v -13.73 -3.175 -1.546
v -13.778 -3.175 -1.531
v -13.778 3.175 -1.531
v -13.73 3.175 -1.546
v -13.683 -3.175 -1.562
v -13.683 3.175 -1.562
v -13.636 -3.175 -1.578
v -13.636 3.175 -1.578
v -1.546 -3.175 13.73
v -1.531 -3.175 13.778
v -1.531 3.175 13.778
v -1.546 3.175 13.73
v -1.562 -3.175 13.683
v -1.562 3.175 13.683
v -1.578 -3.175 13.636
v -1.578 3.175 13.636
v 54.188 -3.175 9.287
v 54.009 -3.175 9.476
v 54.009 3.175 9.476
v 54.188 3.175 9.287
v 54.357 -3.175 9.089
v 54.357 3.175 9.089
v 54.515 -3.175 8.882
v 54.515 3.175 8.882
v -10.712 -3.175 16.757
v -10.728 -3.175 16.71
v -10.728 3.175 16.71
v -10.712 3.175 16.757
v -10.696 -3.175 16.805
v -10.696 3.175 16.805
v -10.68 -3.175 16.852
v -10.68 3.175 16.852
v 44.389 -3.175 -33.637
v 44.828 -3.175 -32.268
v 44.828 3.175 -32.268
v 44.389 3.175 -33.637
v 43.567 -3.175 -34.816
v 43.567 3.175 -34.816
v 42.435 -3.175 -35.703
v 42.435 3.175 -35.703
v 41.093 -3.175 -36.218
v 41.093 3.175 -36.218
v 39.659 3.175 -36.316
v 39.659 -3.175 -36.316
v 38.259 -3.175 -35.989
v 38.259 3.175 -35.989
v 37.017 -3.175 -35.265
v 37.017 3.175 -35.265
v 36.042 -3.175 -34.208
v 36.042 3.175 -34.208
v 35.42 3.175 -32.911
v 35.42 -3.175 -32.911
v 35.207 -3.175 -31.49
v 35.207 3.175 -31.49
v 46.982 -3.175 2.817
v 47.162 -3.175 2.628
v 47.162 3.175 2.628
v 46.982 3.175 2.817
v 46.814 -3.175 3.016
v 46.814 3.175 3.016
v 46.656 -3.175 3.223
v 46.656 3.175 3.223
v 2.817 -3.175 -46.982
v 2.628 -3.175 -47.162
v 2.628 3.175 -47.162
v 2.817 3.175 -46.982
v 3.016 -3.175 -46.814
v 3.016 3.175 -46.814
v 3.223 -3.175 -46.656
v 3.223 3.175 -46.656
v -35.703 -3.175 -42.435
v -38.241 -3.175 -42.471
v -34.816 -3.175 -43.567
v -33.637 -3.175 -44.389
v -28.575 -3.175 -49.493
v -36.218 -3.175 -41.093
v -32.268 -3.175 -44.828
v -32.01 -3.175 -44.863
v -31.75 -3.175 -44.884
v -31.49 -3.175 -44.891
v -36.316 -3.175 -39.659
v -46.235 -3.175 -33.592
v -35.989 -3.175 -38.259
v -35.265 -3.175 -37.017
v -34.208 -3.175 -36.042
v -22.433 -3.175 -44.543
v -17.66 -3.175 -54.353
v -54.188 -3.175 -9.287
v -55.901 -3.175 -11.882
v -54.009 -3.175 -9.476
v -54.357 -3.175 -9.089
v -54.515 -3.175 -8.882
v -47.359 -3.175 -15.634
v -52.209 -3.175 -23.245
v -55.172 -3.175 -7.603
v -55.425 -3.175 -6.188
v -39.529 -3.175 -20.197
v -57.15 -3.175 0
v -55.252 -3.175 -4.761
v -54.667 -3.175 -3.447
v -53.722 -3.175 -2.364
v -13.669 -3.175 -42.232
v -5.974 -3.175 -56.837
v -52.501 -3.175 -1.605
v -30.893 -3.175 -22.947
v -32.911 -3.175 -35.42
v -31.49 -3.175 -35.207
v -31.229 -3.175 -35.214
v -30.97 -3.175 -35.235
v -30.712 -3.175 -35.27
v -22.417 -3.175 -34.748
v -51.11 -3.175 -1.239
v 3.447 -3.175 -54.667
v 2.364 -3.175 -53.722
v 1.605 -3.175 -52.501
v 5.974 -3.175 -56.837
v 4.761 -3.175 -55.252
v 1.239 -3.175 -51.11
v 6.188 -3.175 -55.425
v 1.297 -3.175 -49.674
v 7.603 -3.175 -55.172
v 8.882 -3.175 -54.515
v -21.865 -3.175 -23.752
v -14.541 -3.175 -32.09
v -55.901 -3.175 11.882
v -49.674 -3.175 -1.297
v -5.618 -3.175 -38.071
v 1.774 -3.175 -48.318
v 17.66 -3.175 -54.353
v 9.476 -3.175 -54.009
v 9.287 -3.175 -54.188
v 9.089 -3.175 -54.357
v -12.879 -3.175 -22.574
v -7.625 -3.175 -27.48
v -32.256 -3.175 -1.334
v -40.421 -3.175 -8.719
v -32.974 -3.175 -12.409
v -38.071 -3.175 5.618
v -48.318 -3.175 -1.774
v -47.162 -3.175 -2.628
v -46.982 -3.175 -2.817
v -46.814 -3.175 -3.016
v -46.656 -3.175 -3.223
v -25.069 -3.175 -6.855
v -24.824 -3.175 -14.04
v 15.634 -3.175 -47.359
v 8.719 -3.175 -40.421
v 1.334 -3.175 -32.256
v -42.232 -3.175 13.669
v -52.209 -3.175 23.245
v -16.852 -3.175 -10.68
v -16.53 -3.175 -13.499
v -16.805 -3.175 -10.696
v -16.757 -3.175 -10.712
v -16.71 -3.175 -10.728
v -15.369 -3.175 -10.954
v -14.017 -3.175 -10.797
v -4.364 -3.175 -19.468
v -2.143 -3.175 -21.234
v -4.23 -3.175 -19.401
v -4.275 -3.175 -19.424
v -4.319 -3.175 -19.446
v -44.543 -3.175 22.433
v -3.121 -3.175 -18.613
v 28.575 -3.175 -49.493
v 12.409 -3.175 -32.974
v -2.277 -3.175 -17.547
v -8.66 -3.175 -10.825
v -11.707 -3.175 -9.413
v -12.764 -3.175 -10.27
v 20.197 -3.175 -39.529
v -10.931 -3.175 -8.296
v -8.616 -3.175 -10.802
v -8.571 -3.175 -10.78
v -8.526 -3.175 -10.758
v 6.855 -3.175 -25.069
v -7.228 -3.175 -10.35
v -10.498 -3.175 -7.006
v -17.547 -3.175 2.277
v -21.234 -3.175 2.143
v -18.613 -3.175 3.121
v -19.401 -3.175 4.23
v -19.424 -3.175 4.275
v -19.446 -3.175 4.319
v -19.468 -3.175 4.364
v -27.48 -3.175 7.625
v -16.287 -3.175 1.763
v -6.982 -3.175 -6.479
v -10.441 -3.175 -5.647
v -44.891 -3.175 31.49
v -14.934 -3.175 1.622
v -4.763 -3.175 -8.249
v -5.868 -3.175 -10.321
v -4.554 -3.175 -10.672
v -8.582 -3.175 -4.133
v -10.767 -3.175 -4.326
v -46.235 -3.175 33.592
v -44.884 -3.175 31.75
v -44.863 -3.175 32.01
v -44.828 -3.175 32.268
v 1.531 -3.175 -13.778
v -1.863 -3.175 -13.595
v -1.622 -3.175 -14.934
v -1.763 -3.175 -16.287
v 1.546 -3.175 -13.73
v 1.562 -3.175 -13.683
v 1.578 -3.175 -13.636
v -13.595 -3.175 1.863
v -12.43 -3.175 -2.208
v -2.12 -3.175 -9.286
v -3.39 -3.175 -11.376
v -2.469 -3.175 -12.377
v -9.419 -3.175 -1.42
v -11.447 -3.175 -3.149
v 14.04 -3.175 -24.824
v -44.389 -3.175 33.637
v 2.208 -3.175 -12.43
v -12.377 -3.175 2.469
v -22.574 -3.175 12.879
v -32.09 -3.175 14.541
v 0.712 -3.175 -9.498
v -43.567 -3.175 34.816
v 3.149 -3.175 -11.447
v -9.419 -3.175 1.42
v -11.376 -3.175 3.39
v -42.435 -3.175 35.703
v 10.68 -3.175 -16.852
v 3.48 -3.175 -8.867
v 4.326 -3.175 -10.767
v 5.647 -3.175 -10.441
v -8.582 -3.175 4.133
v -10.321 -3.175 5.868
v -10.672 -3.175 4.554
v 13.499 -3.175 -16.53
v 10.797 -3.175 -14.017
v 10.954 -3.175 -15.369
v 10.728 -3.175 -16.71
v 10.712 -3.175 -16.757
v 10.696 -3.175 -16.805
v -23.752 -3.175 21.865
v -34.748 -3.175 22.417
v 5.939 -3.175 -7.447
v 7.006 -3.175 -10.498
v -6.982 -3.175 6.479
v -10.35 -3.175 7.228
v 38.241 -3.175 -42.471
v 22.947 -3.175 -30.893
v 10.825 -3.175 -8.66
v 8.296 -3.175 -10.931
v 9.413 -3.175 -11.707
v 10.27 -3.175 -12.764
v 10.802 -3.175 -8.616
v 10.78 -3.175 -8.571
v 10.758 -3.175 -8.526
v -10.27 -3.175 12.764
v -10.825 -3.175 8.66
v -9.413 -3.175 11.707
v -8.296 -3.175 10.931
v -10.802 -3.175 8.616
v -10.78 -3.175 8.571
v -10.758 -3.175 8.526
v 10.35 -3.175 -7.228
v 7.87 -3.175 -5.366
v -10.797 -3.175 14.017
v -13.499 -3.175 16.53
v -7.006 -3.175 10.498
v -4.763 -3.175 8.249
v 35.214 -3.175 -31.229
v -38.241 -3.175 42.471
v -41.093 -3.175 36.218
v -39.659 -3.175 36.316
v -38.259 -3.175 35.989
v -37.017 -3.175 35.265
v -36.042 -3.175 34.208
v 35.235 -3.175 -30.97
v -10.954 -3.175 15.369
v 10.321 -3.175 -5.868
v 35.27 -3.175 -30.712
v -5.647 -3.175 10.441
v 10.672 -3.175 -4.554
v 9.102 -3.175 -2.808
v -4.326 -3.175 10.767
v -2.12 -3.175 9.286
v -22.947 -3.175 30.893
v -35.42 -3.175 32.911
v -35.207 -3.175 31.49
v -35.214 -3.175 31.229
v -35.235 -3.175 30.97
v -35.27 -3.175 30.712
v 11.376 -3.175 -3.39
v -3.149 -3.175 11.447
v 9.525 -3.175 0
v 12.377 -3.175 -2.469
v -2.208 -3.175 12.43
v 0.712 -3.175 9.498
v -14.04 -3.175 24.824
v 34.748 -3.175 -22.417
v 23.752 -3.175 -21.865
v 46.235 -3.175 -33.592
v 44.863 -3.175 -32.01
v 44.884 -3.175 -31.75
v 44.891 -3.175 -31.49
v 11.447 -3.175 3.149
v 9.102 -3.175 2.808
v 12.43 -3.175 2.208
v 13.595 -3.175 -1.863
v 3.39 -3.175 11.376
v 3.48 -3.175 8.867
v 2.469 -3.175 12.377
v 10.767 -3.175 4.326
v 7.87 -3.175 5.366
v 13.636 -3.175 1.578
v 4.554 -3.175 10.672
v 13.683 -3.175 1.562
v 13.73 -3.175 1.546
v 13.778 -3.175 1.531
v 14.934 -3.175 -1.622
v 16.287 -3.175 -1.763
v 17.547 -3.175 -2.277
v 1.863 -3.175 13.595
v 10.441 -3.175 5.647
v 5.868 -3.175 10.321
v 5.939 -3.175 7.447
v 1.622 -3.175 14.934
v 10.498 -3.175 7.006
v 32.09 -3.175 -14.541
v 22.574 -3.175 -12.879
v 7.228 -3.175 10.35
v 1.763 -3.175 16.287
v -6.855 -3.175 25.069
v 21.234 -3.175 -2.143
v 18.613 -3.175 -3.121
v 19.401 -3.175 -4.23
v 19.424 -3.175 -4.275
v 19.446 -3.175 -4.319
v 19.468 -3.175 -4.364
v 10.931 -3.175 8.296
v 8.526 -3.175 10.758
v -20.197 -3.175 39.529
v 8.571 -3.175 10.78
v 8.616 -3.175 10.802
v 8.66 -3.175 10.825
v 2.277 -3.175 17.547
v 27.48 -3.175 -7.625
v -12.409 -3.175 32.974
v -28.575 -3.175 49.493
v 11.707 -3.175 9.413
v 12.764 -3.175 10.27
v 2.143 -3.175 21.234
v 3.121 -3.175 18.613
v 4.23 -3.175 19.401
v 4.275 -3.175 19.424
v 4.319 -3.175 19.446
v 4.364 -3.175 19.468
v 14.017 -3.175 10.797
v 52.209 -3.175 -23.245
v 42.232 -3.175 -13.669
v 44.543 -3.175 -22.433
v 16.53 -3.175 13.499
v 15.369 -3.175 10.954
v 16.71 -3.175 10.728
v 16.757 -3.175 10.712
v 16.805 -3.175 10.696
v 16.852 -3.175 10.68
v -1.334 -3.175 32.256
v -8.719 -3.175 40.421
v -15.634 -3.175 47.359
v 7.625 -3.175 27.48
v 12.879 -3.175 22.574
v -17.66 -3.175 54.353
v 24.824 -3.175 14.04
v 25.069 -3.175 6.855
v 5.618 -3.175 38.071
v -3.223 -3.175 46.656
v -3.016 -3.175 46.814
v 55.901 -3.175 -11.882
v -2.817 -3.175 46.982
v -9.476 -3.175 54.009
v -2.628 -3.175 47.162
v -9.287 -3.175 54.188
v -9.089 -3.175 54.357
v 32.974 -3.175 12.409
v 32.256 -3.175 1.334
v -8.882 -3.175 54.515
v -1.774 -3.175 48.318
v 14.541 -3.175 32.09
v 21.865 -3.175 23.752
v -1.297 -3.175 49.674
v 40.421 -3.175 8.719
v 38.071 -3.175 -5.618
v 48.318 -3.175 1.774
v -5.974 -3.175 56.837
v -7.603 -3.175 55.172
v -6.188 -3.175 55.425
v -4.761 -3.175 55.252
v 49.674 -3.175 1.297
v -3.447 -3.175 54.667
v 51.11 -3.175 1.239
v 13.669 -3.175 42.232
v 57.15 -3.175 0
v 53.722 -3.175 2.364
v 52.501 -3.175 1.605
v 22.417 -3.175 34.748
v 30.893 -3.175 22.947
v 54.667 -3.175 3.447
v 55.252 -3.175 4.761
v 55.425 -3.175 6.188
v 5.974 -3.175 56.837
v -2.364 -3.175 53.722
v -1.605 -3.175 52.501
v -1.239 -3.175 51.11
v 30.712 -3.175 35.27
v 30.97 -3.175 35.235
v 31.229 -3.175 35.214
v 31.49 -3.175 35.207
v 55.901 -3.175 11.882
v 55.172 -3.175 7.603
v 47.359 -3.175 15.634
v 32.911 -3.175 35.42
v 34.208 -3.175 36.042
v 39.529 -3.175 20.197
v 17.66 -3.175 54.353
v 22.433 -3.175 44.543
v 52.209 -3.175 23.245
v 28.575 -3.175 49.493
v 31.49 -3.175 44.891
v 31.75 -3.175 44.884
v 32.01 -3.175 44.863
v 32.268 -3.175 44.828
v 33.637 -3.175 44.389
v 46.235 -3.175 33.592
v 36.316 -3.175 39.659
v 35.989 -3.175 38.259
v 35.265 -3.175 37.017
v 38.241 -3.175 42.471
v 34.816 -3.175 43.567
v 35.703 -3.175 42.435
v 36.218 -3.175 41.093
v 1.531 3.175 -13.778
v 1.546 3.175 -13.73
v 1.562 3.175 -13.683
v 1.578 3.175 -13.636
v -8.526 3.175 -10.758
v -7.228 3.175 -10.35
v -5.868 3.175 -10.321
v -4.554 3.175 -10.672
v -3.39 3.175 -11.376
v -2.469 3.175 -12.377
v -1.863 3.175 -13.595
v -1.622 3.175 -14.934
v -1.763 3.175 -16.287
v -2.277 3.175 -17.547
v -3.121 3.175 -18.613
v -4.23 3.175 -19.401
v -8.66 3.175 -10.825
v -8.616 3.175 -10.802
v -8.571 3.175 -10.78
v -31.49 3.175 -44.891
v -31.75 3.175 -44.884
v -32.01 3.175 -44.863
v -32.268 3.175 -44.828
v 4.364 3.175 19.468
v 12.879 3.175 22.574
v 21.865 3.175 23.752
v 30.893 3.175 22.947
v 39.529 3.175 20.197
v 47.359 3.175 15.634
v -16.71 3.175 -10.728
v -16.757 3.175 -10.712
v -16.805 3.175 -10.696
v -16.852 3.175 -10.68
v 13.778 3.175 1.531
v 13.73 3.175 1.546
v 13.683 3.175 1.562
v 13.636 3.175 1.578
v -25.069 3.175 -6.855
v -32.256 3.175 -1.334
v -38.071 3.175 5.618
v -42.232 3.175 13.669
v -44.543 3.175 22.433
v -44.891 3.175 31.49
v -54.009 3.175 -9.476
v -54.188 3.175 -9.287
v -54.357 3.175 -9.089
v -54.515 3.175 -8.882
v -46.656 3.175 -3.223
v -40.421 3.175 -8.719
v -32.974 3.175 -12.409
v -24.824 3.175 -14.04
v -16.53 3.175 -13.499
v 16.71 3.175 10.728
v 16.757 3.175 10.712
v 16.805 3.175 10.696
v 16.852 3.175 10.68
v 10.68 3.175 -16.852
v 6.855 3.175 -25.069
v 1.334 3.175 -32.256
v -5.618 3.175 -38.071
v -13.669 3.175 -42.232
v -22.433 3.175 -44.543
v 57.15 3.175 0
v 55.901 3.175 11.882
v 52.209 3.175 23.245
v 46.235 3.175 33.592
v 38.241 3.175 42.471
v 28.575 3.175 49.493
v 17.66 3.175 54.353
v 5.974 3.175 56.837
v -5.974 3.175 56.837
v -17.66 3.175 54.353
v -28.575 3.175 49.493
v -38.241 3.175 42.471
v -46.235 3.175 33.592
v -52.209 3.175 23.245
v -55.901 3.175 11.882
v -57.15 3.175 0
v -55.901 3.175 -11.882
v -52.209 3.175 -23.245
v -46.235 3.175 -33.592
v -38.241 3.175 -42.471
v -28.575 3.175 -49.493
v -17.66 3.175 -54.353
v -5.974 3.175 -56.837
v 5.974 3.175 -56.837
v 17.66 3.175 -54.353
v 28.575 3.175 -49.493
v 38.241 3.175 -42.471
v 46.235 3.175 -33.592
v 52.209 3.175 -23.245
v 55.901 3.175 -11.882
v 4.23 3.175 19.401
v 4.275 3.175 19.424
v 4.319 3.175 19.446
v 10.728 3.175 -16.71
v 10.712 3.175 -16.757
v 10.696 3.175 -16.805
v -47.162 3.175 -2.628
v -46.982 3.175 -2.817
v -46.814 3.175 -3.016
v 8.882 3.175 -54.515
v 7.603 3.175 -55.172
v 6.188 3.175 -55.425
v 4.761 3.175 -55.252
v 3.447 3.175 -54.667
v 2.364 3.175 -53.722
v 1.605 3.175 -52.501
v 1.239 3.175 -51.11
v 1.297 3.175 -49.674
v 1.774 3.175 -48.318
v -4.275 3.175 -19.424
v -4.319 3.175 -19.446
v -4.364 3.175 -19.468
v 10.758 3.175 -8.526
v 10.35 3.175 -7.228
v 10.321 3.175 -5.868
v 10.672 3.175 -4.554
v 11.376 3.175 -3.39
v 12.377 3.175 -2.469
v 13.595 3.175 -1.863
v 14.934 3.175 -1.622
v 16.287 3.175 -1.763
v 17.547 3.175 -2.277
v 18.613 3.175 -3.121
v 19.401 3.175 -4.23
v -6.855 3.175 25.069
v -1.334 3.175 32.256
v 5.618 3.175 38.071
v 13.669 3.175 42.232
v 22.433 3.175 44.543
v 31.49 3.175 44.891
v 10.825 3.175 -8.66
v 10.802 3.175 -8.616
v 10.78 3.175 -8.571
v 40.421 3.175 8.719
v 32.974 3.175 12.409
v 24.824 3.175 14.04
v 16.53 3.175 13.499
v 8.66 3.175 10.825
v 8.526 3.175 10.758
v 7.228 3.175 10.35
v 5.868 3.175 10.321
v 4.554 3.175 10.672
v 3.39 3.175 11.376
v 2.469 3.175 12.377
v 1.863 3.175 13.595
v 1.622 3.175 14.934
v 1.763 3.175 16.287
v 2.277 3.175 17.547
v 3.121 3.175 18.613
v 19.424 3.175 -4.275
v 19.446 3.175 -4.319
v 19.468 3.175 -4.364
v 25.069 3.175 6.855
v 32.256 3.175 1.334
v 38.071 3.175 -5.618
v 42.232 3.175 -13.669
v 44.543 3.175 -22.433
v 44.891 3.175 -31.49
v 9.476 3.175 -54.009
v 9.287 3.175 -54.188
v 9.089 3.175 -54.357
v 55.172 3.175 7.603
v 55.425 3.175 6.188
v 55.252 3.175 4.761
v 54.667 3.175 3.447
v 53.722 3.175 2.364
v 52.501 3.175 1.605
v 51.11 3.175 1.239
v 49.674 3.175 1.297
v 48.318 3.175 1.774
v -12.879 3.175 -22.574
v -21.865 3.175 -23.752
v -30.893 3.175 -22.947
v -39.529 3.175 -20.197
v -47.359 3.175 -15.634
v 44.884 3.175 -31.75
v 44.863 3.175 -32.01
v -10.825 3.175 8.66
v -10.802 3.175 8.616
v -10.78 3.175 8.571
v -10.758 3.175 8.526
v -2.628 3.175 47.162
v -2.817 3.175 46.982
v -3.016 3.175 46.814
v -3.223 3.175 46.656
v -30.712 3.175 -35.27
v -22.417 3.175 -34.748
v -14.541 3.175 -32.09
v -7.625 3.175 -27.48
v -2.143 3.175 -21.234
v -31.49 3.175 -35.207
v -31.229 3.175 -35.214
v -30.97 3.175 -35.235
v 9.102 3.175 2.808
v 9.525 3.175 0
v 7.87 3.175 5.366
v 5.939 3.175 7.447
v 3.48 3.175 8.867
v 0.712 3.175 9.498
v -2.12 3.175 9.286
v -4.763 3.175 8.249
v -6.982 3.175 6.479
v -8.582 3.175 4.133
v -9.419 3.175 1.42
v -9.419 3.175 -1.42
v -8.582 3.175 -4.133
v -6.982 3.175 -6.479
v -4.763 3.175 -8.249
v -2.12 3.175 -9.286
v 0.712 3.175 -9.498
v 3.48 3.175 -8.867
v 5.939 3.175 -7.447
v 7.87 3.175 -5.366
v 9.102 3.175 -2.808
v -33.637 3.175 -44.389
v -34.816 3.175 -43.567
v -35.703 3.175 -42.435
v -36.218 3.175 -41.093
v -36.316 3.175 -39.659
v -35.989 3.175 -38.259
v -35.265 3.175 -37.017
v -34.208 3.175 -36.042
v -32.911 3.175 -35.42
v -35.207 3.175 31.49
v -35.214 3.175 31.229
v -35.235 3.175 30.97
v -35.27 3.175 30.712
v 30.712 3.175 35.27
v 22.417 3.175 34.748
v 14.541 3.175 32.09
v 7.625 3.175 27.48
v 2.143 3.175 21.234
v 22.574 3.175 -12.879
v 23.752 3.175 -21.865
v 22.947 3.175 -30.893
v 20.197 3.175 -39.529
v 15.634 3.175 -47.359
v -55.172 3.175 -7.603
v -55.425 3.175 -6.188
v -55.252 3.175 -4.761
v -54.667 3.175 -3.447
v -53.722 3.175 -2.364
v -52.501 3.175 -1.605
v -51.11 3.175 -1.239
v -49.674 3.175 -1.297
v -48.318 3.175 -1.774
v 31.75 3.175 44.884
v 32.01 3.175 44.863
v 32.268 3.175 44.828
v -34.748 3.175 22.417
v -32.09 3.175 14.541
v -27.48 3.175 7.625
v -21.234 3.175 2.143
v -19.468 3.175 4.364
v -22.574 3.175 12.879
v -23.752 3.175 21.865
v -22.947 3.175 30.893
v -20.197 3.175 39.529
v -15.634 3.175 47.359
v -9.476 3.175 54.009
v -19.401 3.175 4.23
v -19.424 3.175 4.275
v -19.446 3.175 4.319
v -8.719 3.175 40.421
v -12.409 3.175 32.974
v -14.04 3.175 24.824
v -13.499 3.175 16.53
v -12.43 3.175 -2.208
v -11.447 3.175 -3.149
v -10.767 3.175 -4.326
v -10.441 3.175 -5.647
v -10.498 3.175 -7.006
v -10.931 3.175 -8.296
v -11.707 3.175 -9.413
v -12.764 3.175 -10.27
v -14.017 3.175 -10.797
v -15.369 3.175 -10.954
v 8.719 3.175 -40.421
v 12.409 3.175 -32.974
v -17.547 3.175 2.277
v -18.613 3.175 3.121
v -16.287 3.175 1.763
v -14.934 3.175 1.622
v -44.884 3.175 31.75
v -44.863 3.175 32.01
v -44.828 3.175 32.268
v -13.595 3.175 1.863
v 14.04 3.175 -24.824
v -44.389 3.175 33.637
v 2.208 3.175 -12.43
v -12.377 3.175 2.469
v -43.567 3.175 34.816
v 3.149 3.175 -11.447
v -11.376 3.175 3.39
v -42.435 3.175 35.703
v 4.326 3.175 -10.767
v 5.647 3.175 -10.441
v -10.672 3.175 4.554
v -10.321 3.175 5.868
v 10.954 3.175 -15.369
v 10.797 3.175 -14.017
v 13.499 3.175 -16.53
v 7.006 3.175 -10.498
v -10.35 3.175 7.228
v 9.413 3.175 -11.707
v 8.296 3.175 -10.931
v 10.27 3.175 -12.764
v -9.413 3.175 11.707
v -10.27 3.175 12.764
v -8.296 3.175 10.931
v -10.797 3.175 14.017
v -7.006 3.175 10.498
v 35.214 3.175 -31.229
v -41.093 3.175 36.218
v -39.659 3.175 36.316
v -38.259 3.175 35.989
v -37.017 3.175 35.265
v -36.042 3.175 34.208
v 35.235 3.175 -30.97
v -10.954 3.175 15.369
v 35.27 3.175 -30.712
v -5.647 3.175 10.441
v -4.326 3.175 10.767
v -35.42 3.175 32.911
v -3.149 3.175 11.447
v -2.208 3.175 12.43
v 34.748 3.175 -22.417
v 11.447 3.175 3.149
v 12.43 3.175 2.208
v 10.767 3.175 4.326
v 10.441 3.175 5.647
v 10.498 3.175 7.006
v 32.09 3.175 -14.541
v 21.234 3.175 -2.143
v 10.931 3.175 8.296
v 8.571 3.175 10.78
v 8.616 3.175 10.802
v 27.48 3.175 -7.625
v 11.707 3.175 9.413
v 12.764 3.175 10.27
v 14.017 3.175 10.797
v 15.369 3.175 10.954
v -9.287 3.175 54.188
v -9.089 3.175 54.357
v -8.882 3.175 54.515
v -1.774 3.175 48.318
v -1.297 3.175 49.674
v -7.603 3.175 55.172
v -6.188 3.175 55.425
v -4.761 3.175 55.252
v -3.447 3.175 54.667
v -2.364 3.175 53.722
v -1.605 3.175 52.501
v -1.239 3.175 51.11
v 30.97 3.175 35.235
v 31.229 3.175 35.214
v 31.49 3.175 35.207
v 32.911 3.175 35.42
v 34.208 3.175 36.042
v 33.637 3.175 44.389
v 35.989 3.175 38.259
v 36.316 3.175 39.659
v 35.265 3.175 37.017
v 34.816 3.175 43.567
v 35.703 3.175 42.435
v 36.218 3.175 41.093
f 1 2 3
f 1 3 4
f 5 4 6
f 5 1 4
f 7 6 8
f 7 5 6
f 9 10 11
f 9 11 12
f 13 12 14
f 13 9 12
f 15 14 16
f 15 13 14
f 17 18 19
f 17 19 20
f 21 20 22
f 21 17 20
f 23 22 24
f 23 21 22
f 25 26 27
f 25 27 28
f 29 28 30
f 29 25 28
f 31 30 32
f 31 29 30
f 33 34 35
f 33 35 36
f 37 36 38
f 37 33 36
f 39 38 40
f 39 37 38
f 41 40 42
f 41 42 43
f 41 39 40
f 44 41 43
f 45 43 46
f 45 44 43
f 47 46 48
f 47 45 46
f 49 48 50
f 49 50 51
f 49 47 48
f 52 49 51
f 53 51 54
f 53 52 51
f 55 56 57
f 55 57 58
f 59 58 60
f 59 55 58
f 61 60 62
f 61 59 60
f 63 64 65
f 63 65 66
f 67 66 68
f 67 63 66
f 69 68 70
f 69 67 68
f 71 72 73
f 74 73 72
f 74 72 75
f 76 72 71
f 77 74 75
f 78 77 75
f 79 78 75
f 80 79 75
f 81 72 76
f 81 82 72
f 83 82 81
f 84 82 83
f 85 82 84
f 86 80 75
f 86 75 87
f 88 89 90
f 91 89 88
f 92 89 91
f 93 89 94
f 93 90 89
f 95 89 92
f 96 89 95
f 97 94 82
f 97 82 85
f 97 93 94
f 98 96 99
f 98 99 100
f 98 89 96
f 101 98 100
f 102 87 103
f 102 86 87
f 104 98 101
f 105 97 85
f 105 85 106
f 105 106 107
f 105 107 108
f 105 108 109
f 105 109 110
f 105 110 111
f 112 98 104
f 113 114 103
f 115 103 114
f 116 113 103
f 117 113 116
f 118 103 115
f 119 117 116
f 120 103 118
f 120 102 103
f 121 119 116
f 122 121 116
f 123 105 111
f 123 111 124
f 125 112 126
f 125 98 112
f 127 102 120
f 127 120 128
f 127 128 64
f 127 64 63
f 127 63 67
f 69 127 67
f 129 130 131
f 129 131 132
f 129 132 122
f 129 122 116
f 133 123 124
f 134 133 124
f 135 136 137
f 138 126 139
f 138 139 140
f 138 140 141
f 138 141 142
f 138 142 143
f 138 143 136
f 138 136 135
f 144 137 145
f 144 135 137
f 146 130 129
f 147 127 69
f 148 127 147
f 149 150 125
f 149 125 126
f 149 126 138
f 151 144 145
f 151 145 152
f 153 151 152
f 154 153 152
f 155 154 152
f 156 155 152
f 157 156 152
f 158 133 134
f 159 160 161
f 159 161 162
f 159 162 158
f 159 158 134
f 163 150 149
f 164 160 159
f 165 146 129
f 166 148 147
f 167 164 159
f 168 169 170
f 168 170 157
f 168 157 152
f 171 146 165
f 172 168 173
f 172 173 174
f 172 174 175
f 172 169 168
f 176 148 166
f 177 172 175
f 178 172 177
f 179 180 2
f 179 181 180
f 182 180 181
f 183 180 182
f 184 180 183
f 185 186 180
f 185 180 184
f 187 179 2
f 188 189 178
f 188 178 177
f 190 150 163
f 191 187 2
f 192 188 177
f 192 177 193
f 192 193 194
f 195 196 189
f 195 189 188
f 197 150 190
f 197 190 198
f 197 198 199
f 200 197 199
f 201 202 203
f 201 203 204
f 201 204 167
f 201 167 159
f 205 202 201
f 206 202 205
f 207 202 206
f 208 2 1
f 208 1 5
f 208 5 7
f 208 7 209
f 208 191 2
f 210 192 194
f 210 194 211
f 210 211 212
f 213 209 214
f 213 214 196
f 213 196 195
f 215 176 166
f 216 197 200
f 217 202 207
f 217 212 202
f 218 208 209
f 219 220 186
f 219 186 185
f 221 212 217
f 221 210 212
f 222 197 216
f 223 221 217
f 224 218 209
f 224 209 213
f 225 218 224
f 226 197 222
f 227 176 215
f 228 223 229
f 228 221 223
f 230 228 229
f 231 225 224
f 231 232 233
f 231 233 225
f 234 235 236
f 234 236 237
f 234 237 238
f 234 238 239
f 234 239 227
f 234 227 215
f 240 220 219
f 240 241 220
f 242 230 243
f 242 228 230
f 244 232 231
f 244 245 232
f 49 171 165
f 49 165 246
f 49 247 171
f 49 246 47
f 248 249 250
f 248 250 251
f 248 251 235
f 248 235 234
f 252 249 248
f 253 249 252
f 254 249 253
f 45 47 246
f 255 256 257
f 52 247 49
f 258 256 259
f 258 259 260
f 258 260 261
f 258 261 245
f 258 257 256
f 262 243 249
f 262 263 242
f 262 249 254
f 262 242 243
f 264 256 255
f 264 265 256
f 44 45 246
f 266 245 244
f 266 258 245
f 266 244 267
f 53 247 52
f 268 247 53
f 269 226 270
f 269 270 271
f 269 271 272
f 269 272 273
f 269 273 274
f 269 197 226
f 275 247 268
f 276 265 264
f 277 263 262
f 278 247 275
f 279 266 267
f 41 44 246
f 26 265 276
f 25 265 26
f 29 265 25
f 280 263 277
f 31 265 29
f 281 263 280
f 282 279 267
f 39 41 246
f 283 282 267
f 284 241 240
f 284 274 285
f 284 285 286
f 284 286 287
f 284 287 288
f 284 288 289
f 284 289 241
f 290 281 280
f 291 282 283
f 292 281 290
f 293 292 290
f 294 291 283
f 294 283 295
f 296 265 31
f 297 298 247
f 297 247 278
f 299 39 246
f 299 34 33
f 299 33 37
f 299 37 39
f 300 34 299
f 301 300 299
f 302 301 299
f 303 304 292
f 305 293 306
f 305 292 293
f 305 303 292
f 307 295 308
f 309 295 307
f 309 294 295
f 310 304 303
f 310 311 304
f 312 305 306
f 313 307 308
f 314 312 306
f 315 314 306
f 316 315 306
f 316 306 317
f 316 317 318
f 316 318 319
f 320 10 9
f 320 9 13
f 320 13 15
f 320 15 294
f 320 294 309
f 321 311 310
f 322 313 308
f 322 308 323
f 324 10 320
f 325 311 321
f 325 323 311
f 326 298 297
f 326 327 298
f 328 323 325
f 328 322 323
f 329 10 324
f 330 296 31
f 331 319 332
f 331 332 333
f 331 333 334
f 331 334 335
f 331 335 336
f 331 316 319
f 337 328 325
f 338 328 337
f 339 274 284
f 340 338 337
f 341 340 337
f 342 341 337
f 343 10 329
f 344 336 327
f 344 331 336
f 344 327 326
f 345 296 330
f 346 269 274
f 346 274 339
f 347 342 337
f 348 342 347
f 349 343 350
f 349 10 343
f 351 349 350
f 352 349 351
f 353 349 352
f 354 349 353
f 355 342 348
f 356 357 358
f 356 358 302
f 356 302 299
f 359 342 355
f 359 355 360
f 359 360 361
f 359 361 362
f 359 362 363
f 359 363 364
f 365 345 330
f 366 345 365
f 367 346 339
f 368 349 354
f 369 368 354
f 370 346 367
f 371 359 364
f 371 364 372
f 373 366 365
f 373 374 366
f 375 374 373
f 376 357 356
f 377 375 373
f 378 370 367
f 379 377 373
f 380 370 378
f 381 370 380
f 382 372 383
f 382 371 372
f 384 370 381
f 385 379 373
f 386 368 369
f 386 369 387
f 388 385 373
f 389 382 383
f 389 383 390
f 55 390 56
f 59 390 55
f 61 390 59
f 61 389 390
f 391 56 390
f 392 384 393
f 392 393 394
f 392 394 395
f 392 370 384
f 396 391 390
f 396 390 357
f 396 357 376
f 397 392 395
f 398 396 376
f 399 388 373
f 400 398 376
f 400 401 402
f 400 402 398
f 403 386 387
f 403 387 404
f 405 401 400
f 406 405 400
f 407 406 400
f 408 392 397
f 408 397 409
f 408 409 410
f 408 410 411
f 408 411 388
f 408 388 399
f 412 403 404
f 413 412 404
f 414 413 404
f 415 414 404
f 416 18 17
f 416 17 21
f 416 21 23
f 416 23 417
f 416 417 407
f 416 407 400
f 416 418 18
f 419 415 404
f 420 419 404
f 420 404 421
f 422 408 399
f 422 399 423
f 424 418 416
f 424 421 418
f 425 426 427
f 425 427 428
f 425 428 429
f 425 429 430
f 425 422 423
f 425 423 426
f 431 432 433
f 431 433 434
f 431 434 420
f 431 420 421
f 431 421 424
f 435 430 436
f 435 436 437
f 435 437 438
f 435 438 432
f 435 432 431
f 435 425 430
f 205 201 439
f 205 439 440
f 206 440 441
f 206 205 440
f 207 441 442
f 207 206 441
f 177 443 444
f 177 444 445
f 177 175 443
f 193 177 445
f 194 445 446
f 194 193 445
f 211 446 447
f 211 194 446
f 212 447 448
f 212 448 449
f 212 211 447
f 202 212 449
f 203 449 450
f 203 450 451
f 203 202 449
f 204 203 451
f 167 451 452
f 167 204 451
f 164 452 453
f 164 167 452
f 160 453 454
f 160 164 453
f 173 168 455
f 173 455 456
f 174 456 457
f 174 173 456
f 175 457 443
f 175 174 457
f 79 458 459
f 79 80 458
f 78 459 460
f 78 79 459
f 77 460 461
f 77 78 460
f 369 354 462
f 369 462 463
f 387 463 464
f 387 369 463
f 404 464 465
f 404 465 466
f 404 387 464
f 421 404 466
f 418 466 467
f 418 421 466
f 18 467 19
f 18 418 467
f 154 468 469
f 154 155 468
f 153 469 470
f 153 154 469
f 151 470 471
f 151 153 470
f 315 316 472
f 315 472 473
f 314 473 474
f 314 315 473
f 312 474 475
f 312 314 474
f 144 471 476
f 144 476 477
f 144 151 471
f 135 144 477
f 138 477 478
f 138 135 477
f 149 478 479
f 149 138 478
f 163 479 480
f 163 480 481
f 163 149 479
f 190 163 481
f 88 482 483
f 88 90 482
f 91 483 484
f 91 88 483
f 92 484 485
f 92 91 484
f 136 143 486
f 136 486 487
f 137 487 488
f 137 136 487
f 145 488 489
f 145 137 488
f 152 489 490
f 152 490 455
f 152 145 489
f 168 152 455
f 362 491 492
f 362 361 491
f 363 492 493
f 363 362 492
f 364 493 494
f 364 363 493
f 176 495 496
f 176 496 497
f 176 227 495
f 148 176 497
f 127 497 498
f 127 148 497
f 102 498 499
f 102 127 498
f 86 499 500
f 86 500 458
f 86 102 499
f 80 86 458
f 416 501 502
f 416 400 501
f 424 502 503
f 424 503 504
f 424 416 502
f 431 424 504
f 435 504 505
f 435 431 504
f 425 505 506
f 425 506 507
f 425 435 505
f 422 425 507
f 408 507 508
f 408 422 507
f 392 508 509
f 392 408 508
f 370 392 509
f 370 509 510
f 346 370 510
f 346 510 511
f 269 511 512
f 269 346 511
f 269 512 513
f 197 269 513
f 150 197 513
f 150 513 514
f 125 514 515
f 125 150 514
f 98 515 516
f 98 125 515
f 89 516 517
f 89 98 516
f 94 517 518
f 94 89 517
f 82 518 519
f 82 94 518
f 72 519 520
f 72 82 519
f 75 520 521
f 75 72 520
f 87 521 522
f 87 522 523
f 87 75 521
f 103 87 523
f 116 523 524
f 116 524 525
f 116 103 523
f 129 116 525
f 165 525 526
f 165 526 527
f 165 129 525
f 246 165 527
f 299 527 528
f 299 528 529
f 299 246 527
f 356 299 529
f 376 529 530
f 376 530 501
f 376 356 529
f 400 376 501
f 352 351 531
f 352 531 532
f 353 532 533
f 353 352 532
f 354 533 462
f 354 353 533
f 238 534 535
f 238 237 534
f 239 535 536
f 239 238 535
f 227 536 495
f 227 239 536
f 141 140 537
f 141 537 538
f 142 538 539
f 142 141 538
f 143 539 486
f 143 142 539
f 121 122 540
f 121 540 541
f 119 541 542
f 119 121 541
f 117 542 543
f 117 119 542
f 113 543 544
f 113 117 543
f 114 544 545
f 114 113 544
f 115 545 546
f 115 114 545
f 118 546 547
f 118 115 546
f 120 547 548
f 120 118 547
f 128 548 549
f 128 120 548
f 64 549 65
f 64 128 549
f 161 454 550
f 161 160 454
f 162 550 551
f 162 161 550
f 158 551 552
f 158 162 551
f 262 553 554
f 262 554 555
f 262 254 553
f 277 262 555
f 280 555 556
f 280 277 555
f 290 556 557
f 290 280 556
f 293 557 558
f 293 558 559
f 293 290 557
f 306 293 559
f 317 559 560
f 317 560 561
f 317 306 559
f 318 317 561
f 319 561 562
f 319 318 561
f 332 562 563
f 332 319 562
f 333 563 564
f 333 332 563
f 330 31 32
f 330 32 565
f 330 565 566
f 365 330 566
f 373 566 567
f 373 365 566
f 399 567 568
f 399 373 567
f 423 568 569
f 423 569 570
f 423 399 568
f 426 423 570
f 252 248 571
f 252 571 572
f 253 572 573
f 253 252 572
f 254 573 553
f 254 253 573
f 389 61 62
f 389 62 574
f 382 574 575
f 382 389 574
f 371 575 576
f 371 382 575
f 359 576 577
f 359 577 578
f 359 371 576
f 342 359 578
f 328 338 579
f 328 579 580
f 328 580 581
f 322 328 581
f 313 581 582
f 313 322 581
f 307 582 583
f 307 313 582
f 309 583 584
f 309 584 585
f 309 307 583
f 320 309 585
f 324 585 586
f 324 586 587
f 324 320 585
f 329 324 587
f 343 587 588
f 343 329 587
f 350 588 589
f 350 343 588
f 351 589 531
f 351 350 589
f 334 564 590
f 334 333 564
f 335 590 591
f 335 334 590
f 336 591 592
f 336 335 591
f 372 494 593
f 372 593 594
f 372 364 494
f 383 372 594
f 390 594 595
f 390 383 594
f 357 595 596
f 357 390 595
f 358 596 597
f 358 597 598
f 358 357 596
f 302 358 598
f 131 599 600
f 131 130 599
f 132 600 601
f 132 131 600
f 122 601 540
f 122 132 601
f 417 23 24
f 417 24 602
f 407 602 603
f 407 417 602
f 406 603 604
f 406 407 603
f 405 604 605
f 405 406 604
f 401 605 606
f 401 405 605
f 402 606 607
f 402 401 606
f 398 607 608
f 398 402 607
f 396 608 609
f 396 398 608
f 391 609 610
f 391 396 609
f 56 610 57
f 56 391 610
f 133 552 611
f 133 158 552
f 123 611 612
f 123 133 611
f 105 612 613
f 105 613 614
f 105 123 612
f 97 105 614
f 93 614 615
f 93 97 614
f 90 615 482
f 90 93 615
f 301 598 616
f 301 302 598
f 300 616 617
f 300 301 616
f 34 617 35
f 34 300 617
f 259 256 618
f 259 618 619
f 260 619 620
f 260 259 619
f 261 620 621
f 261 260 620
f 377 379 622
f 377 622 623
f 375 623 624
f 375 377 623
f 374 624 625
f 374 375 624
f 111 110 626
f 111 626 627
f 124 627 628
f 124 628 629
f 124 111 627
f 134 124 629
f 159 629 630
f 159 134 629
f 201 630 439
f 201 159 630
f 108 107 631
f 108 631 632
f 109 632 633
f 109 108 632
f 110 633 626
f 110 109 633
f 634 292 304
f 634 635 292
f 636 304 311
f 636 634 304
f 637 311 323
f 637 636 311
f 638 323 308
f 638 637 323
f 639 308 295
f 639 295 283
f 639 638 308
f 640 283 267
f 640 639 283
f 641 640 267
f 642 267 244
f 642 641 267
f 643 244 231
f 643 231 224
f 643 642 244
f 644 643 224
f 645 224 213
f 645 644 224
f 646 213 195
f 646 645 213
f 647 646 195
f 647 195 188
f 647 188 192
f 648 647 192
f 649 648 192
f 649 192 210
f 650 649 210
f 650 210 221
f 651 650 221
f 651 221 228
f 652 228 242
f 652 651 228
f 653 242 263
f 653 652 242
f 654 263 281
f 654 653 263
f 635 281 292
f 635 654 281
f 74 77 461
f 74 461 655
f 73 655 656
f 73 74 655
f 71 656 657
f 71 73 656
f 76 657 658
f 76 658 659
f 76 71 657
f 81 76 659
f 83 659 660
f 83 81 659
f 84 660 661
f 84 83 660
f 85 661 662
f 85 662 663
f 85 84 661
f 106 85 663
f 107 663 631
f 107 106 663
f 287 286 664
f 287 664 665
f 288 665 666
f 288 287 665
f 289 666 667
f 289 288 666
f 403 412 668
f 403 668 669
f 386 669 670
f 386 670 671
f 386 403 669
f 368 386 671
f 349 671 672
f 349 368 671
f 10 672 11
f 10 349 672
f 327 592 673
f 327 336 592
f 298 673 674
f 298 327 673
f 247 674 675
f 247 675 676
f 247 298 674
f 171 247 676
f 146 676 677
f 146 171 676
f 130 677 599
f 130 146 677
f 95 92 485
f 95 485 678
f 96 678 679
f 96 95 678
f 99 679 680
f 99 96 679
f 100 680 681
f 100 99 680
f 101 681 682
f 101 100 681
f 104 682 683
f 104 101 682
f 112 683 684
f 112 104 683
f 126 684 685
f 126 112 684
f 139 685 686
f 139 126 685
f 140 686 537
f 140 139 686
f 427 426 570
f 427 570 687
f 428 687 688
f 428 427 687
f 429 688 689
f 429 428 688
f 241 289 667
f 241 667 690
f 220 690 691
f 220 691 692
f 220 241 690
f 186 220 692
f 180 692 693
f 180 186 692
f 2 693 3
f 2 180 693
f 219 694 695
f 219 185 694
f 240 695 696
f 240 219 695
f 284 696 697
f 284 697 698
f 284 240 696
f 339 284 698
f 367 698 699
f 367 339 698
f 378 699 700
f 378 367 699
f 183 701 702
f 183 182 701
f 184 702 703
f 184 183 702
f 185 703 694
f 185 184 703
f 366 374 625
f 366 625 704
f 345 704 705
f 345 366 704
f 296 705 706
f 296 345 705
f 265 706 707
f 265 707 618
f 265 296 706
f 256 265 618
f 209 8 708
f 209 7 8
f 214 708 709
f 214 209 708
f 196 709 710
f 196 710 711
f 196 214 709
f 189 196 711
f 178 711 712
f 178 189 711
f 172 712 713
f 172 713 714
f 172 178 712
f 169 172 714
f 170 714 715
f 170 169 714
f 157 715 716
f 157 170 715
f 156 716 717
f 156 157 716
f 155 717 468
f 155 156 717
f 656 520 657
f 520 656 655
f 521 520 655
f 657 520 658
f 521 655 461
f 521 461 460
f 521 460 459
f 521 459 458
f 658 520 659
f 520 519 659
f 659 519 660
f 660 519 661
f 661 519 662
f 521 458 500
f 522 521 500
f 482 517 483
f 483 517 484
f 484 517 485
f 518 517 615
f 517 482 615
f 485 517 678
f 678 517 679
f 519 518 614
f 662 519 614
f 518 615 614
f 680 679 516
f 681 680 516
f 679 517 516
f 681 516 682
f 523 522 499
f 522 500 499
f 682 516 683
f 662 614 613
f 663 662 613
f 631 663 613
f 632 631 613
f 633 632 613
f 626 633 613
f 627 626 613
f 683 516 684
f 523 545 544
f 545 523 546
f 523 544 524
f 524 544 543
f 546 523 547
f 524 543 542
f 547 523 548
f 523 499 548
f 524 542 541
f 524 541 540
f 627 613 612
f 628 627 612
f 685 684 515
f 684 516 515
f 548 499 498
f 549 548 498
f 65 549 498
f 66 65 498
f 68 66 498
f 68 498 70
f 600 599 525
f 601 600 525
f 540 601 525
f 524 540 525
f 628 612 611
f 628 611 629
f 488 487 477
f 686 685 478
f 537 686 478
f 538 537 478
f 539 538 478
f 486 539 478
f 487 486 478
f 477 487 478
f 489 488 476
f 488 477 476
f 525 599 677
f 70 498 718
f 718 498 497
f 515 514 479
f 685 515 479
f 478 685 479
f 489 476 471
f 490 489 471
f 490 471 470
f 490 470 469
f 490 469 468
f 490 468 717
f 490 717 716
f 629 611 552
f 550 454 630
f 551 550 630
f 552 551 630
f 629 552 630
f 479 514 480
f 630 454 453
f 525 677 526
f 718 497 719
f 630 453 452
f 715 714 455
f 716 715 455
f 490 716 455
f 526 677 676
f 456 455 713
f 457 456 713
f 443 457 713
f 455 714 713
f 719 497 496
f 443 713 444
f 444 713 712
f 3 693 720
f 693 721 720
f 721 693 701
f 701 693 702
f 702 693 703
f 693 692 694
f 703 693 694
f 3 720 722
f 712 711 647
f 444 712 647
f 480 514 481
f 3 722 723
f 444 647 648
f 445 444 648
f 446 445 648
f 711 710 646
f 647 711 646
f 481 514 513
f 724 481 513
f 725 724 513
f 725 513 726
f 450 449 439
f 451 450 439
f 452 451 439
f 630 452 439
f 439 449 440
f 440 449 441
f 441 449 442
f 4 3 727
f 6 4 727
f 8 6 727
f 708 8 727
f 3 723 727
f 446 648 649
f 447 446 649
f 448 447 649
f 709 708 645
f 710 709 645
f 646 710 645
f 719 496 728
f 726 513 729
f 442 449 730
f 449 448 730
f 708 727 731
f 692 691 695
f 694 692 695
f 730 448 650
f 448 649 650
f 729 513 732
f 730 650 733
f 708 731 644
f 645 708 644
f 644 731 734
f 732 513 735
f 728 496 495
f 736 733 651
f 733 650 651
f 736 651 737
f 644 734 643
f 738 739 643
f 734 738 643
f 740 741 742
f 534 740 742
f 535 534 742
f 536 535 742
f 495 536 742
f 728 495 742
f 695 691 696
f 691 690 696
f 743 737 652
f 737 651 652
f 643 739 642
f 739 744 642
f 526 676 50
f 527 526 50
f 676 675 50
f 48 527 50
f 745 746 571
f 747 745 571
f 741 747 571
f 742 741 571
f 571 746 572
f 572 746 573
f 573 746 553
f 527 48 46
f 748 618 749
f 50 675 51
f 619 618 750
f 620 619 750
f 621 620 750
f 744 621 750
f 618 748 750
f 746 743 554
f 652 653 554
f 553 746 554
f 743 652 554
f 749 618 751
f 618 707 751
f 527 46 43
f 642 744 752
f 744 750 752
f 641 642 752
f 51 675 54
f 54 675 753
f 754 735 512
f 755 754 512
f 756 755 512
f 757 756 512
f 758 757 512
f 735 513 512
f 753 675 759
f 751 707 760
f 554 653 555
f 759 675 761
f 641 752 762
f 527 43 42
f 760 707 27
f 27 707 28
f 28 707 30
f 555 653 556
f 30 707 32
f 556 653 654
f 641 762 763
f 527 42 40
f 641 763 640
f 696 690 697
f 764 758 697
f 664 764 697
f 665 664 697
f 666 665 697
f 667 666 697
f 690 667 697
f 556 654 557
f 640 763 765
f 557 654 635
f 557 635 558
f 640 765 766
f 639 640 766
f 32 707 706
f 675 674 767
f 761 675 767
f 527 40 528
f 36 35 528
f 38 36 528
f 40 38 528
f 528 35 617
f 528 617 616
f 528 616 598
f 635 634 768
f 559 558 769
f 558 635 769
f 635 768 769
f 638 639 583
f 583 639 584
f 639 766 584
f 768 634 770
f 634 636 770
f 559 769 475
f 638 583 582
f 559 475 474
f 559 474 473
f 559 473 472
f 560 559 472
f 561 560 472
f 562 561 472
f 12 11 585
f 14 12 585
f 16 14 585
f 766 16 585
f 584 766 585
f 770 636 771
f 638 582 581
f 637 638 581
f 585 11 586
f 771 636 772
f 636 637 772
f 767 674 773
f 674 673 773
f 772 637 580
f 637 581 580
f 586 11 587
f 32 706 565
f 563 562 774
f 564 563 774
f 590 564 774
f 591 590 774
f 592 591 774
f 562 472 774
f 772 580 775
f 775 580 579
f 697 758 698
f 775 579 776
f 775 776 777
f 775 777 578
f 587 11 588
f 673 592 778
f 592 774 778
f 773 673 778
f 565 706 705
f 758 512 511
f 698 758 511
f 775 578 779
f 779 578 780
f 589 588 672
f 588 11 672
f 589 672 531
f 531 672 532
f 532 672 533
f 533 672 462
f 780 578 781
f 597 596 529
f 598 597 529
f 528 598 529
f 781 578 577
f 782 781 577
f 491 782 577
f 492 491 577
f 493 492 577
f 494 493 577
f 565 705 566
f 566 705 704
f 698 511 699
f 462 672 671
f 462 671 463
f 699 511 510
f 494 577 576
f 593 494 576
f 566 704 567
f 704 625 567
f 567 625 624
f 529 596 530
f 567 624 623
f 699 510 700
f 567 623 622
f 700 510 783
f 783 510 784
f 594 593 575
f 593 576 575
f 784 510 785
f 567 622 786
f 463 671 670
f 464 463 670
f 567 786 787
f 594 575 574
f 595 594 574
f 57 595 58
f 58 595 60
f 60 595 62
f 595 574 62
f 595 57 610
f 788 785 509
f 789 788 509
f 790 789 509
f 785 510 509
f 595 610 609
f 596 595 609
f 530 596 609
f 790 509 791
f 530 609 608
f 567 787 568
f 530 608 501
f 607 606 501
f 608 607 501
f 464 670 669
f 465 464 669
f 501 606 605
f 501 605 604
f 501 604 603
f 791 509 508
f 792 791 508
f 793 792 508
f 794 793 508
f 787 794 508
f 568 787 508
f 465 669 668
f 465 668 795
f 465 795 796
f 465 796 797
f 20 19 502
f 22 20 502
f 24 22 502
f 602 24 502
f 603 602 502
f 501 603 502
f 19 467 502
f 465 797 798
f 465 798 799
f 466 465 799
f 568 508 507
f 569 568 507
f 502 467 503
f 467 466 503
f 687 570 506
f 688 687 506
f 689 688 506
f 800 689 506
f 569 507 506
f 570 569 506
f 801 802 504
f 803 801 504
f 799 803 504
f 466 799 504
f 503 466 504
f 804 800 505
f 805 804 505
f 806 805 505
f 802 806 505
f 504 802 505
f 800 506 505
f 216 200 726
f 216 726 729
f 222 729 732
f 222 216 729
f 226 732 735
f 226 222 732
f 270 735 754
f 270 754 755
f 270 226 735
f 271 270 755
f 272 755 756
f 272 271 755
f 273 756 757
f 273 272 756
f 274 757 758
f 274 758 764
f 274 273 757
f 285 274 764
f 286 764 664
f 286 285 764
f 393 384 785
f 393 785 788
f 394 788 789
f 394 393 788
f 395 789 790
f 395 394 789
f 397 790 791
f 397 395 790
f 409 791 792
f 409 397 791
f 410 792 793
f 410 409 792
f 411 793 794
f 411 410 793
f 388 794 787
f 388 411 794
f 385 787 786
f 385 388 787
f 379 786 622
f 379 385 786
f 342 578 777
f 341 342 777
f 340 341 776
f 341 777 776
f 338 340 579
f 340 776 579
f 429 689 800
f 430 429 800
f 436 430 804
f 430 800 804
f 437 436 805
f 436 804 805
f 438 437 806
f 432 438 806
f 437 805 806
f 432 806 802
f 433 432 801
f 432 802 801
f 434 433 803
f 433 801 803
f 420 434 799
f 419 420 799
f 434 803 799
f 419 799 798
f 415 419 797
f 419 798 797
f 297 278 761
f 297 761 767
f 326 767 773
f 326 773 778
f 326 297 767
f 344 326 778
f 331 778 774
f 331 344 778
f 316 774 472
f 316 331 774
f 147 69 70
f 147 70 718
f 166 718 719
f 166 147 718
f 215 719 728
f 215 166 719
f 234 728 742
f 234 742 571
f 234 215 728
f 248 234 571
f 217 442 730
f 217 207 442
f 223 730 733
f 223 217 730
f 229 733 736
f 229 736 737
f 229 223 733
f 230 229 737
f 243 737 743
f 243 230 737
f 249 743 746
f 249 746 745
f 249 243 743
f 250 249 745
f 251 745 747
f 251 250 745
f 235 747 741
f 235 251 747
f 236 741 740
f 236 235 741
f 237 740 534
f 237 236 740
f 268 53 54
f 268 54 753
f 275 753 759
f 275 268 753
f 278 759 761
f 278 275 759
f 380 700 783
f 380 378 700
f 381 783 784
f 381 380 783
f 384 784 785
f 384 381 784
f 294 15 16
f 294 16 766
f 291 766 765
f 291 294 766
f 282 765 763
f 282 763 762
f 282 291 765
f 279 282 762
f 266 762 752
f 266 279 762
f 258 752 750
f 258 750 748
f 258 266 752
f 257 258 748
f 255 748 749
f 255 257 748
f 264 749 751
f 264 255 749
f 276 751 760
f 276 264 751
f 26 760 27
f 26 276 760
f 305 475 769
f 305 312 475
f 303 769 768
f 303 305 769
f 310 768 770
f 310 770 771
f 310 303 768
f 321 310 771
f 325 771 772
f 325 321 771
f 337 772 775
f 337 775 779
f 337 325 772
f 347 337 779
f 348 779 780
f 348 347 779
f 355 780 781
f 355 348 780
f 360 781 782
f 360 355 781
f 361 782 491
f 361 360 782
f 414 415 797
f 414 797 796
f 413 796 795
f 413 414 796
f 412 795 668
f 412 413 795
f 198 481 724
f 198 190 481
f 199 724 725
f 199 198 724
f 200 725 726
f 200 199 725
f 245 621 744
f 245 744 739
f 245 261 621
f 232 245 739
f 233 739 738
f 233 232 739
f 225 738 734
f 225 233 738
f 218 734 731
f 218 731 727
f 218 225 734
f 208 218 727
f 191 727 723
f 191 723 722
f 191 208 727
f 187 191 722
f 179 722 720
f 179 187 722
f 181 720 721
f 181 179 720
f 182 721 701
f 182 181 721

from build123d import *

# Parameters (mm, degrees)
F0_R     = 57.15
F0_R_2   = 9.525
F1_DEPTH = 3.175


with BuildPart() as f1:
    # F0 (on Front) → F1 (new body, symmetric)
    with BuildSketch(Plane.XZ):
        Circle(F0_R)
        with BuildLine():
            ThreePointArc((-32.267608, -44.82798), (-36.315903, -39.658594), (-31.489624, -35.206824))
            ThreePointArc((-31.489624, -35.206824), (-31.099362, -35.222577), (-30.711639, -35.269733))
            ThreePointArc((-30.711639, -35.269733), (-10.931764, -30.012682), (1.53061, -13.777866))
            ThreePointArc((1.53061, -13.777866), (1.553959, -13.706546), (1.578414, -13.635598))
            ThreePointArc((1.578414, -13.635598), (7.66651, -10.668663), (10.727742, -16.709895))
            ThreePointArc((10.727742, -16.709895), (10.704393, -16.781215), (10.679938, -16.852163))
            ThreePointArc((10.679938, -16.852163), (-5.618196, -38.070526), (-31.489624, -44.890889))
            ThreePointArc((-31.489624, -44.890889), (-31.879886, -44.875136), (-32.267608, -44.82798))
        make_face(mode=Mode.SUBTRACT)
        with BuildLine():
            ThreePointArc((-54.514813, -8.881524), (-53.722082, -2.36364), (-47.16151, -2.628457))
            ThreePointArc((-47.16151, -2.628457), (-46.896692, -2.915553), (-46.655876, -3.223059))
            ThreePointArc((-46.655876, -3.223059), (-28.952096, -13.492246), (-8.660118, -10.824727))
            ThreePointArc((-8.660118, -10.824727), (-8.593177, -10.790807), (-8.525717, -10.757931))
            ThreePointArc((-8.525717, -10.757931), (-2.122843, -12.964926), (-4.230021, -19.401339))
            ThreePointArc((-4.230021, -19.401339), (-4.296962, -19.43526), (-4.364422, -19.468135))
            ThreePointArc((-4.364422, -19.468135), (-30.892592, -22.947263), (-54.009178, -9.476126))
            ThreePointArc((-54.009178, -9.476126), (-54.273996, -9.18903), (-54.514813, -8.881524))
        make_face(mode=Mode.SUBTRACT)
        with BuildLine():
            ThreePointArc((8.881524, -54.514813), (2.36364, -53.722082), (2.628457, -47.16151))
            ThreePointArc((2.628457, -47.16151), (2.915553, -46.896692), (3.223059, -46.655876))
            ThreePointArc((3.223059, -46.655876), (13.492246, -28.952096), (10.824727, -8.660118))
            ThreePointArc((10.824727, -8.660118), (10.790807, -8.593177), (10.757931, -8.525717))
            ThreePointArc((10.757931, -8.525717), (12.964926, -2.122843), (19.401339, -4.230021))
            ThreePointArc((19.401339, -4.230021), (19.43526, -4.296962), (19.468135, -4.364422))
            ThreePointArc((19.468135, -4.364422), (22.947263, -30.892592), (9.476126, -54.009178))
            ThreePointArc((9.476126, -54.009178), (9.18903, -54.273996), (8.881524, -54.514813))
        make_face(mode=Mode.SUBTRACT)
        with BuildLine():
            ThreePointArc((44.82798, -32.267608), (39.658594, -36.315903), (35.206824, -31.489624))
            ThreePointArc((35.206824, -31.489624), (35.222577, -31.099362), (35.269733, -30.711639))
            ThreePointArc((35.269733, -30.711639), (30.012682, -10.931764), (13.777866, 1.53061))
            ThreePointArc((13.777866, 1.53061), (13.706546, 1.553959), (13.635598, 1.578414))
            ThreePointArc((13.635598, 1.578414), (10.668663, 7.66651), (16.709895, 10.727742))
            ThreePointArc((16.709895, 10.727742), (16.781215, 10.704393), (16.852163, 10.679938))
            ThreePointArc((16.852163, 10.679938), (38.070526, -5.618196), (44.890889, -31.489624))
            ThreePointArc((44.890889, -31.489624), (44.875136, -31.879886), (44.82798, -32.267608))
        make_face(mode=Mode.SUBTRACT)
        with BuildLine():
            ThreePointArc((-44.82798, 32.267608), (-39.658594, 36.315903), (-35.206824, 31.489624))
            ThreePointArc((-35.206824, 31.489624), (-35.222577, 31.099362), (-35.269733, 30.711639))
            ThreePointArc((-35.269733, 30.711639), (-30.012682, 10.931764), (-13.777866, -1.53061))
            ThreePointArc((-13.777866, -1.53061), (-13.706546, -1.553959), (-13.635598, -1.578414))
            ThreePointArc((-13.635598, -1.578414), (-10.668663, -7.66651), (-16.709895, -10.727742))
            ThreePointArc((-16.709895, -10.727742), (-16.781215, -10.704393), (-16.852163, -10.679938))
            ThreePointArc((-16.852163, -10.679938), (-38.070526, 5.618196), (-44.890889, 31.489624))
            ThreePointArc((-44.890889, 31.489624), (-44.875136, 31.879886), (-44.82798, 32.267608))
        make_face(mode=Mode.SUBTRACT)
        with BuildLine():
            ThreePointArc((-8.881524, 54.514813), (-2.36364, 53.722082), (-2.628457, 47.16151))
            ThreePointArc((-2.628457, 47.16151), (-2.915553, 46.896692), (-3.223059, 46.655876))
            ThreePointArc((-3.223059, 46.655876), (-13.492246, 28.952096), (-10.824727, 8.660118))
            ThreePointArc((-10.824727, 8.660118), (-10.790807, 8.593177), (-10.757931, 8.525717))
            ThreePointArc((-10.757931, 8.525717), (-12.964926, 2.122843), (-19.401339, 4.230021))
            ThreePointArc((-19.401339, 4.230021), (-19.43526, 4.296962), (-19.468135, 4.364422))
            ThreePointArc((-19.468135, 4.364422), (-22.947263, 30.892592), (-9.476126, 54.009178))
            ThreePointArc((-9.476126, 54.009178), (-9.18903, 54.273996), (-8.881524, 54.514813))
        make_face(mode=Mode.SUBTRACT)
        Circle(F0_R_2, mode=Mode.SUBTRACT)
        with BuildLine():
            ThreePointArc((54.514813, 8.881524), (53.722082, 2.36364), (47.16151, 2.628457))
            ThreePointArc((47.16151, 2.628457), (46.896692, 2.915553), (46.655876, 3.223059))
            ThreePointArc((46.655876, 3.223059), (28.952096, 13.492246), (8.660118, 10.824727))
            ThreePointArc((8.660118, 10.824727), (8.593177, 10.790807), (8.525717, 10.757931))
            ThreePointArc((8.525717, 10.757931), (2.122843, 12.964926), (4.230021, 19.401339))
            ThreePointArc((4.230021, 19.401339), (4.296962, 19.43526), (4.364422, 19.468135))
            ThreePointArc((4.364422, 19.468135), (30.892592, 22.947263), (54.009178, 9.476126))
            ThreePointArc((54.009178, 9.476126), (54.273996, 9.18903), (54.514813, 8.881524))
        make_face(mode=Mode.SUBTRACT)
        with BuildLine():
            ThreePointArc((32.267608, 44.82798), (36.315903, 39.658594), (31.489624, 35.206824))
            ThreePointArc((31.489624, 35.206824), (31.099362, 35.222577), (30.711639, 35.269733))
            ThreePointArc((30.711639, 35.269733), (10.931764, 30.012682), (-1.53061, 13.777866))
            ThreePointArc((-1.53061, 13.777866), (-1.553959, 13.706546), (-1.578414, 13.635598))
            ThreePointArc((-1.578414, 13.635598), (-7.66651, 10.668663), (-10.727742, 16.709895))
            ThreePointArc((-10.727742, 16.709895), (-10.704393, 16.781215), (-10.679938, 16.852163))
            ThreePointArc((-10.679938, 16.852163), (5.618196, 38.070526), (31.489624, 44.890889))
            ThreePointArc((31.489624, 44.890889), (31.879886, 44.875136), (32.267608, 44.82798))
        make_face(mode=Mode.SUBTRACT)
    extrude(amount=F1_DEPTH, both=True)


solid = f1.part
